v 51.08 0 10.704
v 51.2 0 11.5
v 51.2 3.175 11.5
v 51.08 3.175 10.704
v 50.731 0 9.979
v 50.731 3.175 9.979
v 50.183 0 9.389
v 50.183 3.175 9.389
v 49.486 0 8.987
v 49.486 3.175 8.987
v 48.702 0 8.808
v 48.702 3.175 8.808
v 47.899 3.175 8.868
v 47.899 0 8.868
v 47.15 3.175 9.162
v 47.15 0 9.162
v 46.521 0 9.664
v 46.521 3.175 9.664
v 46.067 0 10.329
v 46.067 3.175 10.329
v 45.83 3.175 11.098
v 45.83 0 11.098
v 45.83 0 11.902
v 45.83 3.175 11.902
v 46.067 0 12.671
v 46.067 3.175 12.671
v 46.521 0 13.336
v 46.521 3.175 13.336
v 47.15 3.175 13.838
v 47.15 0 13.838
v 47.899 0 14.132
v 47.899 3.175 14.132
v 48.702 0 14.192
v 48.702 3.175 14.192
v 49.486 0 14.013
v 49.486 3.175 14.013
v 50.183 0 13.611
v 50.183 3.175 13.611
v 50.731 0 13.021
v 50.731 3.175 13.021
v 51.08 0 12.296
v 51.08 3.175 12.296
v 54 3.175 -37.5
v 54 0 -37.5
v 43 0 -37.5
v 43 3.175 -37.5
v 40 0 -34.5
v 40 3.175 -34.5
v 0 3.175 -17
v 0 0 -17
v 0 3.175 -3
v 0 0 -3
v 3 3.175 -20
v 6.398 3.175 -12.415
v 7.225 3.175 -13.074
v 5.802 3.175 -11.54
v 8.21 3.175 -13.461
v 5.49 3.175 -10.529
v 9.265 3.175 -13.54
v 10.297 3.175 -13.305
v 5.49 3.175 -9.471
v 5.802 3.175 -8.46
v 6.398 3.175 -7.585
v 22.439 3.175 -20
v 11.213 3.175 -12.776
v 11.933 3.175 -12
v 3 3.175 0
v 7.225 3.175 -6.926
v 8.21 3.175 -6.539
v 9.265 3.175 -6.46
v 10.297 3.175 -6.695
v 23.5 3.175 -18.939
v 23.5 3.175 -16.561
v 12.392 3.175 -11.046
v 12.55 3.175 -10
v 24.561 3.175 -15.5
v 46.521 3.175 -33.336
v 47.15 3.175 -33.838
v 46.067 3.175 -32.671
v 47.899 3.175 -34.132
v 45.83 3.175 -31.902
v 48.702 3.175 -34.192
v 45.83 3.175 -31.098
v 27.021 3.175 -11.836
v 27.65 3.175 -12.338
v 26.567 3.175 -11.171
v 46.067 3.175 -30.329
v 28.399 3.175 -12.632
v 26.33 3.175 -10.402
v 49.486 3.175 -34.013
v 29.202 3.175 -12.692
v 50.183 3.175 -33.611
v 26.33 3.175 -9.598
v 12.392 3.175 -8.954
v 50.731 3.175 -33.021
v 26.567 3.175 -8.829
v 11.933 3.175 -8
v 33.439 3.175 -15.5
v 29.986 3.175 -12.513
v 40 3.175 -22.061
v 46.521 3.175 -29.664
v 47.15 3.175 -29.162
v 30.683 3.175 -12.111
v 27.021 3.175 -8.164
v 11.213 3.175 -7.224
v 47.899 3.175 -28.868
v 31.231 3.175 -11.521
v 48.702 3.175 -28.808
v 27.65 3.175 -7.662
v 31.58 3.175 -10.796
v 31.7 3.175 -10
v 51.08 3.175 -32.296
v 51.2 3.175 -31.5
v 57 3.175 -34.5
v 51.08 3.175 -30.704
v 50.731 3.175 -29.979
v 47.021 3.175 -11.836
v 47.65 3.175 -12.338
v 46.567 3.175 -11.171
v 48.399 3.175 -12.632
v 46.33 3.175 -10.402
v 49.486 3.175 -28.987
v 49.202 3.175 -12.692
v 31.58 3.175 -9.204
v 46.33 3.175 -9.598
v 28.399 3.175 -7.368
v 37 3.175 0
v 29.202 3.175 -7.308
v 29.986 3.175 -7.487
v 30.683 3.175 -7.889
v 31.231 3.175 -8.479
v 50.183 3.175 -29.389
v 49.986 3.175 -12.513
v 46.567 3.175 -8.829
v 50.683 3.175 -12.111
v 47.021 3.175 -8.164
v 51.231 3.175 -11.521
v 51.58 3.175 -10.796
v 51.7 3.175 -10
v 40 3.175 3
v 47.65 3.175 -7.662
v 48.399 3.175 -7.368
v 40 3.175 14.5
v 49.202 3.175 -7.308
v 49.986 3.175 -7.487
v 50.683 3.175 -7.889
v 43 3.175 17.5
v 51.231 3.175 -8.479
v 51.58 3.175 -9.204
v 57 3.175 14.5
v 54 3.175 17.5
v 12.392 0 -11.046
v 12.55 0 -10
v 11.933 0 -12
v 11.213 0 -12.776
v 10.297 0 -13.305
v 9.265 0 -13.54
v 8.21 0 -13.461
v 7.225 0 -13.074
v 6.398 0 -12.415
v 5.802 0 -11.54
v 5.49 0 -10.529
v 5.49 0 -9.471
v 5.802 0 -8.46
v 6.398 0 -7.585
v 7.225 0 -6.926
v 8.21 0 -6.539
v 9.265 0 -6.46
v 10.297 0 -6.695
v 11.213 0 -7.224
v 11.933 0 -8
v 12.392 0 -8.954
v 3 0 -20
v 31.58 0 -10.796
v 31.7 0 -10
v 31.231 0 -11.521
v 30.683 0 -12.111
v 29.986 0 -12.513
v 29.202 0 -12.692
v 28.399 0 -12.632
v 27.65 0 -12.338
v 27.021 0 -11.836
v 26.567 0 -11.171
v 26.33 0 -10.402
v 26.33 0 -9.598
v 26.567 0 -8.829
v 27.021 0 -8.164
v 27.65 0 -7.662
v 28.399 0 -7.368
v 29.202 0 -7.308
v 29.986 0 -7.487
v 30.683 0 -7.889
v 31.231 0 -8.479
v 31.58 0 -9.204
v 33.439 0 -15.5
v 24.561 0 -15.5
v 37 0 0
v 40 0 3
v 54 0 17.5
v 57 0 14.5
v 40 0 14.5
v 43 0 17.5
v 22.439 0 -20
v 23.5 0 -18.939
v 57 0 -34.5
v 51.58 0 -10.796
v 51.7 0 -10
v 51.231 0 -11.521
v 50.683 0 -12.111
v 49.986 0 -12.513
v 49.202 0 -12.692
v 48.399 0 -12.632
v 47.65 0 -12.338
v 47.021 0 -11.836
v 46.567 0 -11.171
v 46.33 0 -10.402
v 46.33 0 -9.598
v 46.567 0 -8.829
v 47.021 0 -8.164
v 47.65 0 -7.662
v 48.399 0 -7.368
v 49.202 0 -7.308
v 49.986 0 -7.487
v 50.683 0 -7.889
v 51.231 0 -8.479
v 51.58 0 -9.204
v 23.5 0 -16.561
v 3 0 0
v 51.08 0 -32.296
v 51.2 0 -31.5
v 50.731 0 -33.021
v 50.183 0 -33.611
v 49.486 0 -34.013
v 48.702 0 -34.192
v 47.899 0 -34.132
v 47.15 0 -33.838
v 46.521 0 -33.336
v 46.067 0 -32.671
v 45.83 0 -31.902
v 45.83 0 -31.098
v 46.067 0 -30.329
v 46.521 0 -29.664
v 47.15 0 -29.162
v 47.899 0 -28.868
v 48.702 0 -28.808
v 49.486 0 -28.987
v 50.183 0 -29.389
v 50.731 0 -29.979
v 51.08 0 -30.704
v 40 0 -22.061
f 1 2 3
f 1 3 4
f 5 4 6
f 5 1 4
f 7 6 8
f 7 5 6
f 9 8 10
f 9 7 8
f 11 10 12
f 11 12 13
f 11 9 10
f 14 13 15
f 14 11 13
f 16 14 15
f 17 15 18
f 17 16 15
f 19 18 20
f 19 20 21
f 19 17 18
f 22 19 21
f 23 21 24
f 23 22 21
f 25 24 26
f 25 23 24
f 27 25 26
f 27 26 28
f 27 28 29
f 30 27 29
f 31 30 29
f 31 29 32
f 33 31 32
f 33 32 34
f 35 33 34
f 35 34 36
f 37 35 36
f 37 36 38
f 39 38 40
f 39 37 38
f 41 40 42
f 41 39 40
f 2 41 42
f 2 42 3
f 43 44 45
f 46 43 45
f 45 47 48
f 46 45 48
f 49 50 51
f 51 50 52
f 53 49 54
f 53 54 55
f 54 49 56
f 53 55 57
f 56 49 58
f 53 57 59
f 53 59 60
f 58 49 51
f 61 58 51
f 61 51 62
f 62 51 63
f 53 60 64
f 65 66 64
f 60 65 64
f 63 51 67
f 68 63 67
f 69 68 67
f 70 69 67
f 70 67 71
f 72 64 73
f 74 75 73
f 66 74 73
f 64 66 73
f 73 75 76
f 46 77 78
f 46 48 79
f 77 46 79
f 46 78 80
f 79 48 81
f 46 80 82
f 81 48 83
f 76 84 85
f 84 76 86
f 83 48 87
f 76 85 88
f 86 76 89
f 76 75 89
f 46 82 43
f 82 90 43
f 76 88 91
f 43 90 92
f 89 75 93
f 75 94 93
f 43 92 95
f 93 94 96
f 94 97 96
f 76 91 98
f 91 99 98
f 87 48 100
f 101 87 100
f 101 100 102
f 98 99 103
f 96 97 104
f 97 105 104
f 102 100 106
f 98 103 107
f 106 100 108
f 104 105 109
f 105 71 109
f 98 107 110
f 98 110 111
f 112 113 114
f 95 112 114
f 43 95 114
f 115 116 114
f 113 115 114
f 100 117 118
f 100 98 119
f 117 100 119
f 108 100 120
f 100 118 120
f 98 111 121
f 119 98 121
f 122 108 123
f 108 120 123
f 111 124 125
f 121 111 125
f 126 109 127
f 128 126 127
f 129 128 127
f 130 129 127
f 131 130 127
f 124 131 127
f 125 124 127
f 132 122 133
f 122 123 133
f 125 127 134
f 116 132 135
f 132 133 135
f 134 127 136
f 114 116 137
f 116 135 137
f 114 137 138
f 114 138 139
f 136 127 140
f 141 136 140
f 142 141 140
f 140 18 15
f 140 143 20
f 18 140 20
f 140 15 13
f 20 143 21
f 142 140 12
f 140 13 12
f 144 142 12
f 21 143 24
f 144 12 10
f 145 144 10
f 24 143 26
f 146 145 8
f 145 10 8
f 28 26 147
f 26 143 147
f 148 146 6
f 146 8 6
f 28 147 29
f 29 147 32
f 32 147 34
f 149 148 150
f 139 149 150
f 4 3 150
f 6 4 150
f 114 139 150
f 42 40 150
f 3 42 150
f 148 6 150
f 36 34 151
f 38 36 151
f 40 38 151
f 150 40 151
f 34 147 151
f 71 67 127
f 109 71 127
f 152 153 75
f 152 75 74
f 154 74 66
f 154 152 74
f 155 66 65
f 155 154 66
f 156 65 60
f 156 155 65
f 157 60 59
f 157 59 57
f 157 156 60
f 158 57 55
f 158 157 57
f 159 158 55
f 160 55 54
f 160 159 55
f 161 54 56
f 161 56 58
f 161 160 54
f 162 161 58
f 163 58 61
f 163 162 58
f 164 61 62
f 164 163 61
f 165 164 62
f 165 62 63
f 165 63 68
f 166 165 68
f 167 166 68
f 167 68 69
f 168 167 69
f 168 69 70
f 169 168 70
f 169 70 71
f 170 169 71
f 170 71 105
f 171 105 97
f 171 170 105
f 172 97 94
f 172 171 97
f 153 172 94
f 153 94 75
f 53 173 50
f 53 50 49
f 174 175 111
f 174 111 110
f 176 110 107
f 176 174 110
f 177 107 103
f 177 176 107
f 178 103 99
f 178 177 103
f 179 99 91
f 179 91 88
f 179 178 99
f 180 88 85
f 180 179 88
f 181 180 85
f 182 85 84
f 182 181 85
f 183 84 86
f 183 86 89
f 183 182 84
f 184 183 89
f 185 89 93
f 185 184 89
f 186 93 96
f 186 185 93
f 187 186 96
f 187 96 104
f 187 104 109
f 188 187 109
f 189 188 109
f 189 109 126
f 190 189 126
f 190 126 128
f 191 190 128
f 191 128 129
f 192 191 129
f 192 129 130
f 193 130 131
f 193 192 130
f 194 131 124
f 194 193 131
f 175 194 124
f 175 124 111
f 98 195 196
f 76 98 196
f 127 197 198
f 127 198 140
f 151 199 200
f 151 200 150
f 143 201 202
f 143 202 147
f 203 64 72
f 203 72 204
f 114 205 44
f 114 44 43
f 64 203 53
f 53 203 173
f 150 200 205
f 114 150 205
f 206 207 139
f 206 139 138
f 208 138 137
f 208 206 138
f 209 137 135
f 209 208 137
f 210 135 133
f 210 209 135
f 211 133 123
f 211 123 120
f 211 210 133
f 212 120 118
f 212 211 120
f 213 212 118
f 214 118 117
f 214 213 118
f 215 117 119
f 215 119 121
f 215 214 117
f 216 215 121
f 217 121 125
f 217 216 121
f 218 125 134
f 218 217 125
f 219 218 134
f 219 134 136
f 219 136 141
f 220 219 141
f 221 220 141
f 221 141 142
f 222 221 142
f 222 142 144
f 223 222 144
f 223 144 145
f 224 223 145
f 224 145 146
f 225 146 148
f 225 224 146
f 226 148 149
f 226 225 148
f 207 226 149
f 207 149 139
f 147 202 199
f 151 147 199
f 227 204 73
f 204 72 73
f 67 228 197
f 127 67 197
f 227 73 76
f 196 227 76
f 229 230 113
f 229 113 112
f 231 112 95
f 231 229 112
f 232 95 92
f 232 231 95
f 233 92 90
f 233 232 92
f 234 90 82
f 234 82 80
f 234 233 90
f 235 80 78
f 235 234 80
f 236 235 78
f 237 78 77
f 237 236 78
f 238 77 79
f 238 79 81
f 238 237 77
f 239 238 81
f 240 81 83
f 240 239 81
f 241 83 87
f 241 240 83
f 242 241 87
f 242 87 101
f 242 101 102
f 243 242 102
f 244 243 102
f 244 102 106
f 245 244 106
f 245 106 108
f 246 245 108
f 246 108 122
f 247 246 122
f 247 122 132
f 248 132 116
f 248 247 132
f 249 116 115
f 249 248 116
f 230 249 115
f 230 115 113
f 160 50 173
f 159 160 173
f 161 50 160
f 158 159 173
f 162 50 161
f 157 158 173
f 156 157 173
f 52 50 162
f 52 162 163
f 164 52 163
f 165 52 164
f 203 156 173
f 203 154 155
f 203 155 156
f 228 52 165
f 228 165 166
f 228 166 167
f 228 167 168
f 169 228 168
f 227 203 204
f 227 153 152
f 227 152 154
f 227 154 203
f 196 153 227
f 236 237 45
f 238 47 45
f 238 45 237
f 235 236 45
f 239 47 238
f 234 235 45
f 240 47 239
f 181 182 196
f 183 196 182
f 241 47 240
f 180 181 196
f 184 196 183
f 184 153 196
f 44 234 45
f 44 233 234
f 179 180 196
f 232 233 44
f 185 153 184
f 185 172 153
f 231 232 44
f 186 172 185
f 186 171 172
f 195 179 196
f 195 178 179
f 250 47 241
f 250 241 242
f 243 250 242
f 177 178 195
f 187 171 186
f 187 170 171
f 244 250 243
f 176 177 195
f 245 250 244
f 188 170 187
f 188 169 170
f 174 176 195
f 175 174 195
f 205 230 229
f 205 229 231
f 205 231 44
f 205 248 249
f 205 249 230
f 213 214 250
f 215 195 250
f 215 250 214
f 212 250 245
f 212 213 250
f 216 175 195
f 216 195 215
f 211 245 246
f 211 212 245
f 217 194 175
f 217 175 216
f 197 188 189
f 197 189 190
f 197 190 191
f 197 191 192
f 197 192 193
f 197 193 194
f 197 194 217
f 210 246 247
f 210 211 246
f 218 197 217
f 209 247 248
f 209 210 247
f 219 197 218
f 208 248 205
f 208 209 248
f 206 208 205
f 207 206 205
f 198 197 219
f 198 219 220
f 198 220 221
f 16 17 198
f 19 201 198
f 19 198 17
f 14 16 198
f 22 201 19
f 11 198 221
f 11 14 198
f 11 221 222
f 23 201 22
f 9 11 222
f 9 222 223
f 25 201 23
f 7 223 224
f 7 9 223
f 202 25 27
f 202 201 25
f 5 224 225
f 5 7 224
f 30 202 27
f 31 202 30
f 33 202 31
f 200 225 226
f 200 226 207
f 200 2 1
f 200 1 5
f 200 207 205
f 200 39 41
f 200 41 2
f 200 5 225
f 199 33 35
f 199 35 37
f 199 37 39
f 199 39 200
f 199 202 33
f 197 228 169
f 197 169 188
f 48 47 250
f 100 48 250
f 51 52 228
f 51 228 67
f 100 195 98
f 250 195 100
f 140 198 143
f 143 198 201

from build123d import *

# Parameters (mm, degrees)
SKETCH1_R           = 2.7
SKETCH1_R_2         = 3.55
BOSS_EXTRUDE1_DEPTH = 3.175
CHAMFER1_SIZE       = 3
CUT_EXTRUDE2_REACH  = 5.175
CUT_EXTRUDE3_START  = -3.175
SKETCH8_W           = 11
SKETCH8_H           = 1.8
CUT_EXTRUDE3_DEPTH  = 3.175
SKETCH9_W           = 8.878679656
SKETCH9_H           = 1.6
BOSS_EXTRUDE2_DEPTH = 3.175
BOSS_EXTRUDE3_DEPTH = 3.175
CUT_EXTRUDE4_REACH  = 5.175
CHAMFER3_SIZE       = 1.060660172
CHAMFER4_SIZE       = 3


with BuildPart() as part:
    # Sketch1 → Boss-Extrude1 (new body)
    with BuildSketch(Plane(origin=(0, 0, 0), x_dir=(1, 0, 0), z_dir=(0, 1, 0))):
        Polygon((0, 0), (40, 0), (40, -17.5), (57, -17.5), (57, 37.5), (40, 37.5), (40, 20), (0, 20), align=None)
        with Locations((29, 10)):
            Circle(SKETCH1_R, mode=Mode.SUBTRACT)
        with Locations((9, 10)):
            Circle(SKETCH1_R_2, mode=Mode.SUBTRACT)
        with Locations((48.5, 31.5)):
            Circle(SKETCH1_R, mode=Mode.SUBTRACT)
        with Locations((48.5, -11.5)):
            Circle(SKETCH1_R, mode=Mode.SUBTRACT)
        with Locations((49, 10)):
            Circle(SKETCH1_R, mode=Mode.SUBTRACT)
    extrude(amount=BOSS_EXTRUDE1_DEPTH)

    # Chamfer1
    chamfer1_edges = [part.edges().sort_by_distance(p)[0] for p in [
        (0, 1.5875, -20),
        (40, 1.5875, -37.5),
        (57, 1.5875, -37.5),
        (57, 1.5875, 17.5),
        (40, 1.5875, 17.5),
        (0, 1.5875, 0),
    ]]
    chamfer(chamfer1_edges, length=CHAMFER1_SIZE)

    # Sketch6 → Cut-Extrude2 (cut, up to next)
    with BuildSketch(Plane(origin=(0, 3.175, 0), x_dir=(1, 0, 0), z_dir=(0, 1, 0)), mode=Mode.PRIVATE) as cut_extrude2_sk1:
        Polygon((23.5, 16.560660172), (26.160660172, 13.9), (31.839339828, 13.9), (34.5, 16.560660172), (34.5, 18.2), (32.125, 18.2), (32.125, 18.545), (33.58, 20), (24.42, 20), (25.875, 18.545), (25.875, 18.2), (23.5, 18.2), align=None)
    cut_extrude2_tool1 = extrude(cut_extrude2_sk1.sketch, amount=-CUT_EXTRUDE2_REACH, mode=Mode.PRIVATE) & part.part
    add(cut_extrude2_tool1.solids().sort_by_distance((29, 3.175, -16.994051))[0], mode=Mode.SUBTRACT)

    # Sketch8 → Cut-Extrude3 (cut)
    with BuildSketch(Plane.XZ.offset(CUT_EXTRUDE3_START)):
        with Locations((29, -19.1)):
            Rectangle(SKETCH8_W, SKETCH8_H)
    extrude(amount=CUT_EXTRUDE3_DEPTH, mode=Mode.SUBTRACT)

    # Sketch9 → Boss-Extrude2 (add)
    with BuildSketch(Plane(origin=(0, 0, 0), x_dir=(-1, 0, 0), z_dir=(0, -1, 0))):
        with Locations((-29, 14.7)):
            Rectangle(SKETCH9_W, SKETCH9_H)
    extrude(amount=-BOSS_EXTRUDE2_DEPTH)

    # Sketch10 → Boss-Extrude3 (add)
    with BuildSketch(Plane.XZ):
        Polygon((40, -22.060660172), (40, -20), (37.939339828, -20), align=None)
    extrude(amount=-BOSS_EXTRUDE3_DEPTH)

    # Sketch11 → Cut-Extrude4 (cut, up to next)
    with BuildSketch(Plane.XZ, mode=Mode.PRIVATE) as cut_extrude4_sk1:
        Polygon((34.5, -16.560660172), (37.939339828, -20), (34.5, -20), align=None)
    cut_extrude4_tool1 = extrude(cut_extrude4_sk1.sketch, amount=-CUT_EXTRUDE4_REACH, mode=Mode.PRIVATE) & part.part
    add(cut_extrude4_tool1.solids().sort_by_distance((35.646447, 0, -18.853553))[0], mode=Mode.SUBTRACT)

    # Chamfer3
    chamfer3_edges = [part.edges().sort_by_distance(p)[0] for p in [
        (23.5, 1.5875, -20),
    ]]
    chamfer(chamfer3_edges, length=CHAMFER3_SIZE)

    # Chamfer4
    chamfer4_edges = [part.edges().sort_by_distance(p)[0] for p in [
        (40, 1.5875, 0),
    ]]
    chamfer(chamfer4_edges, length=CHAMFER4_SIZE)


solid = part.part
